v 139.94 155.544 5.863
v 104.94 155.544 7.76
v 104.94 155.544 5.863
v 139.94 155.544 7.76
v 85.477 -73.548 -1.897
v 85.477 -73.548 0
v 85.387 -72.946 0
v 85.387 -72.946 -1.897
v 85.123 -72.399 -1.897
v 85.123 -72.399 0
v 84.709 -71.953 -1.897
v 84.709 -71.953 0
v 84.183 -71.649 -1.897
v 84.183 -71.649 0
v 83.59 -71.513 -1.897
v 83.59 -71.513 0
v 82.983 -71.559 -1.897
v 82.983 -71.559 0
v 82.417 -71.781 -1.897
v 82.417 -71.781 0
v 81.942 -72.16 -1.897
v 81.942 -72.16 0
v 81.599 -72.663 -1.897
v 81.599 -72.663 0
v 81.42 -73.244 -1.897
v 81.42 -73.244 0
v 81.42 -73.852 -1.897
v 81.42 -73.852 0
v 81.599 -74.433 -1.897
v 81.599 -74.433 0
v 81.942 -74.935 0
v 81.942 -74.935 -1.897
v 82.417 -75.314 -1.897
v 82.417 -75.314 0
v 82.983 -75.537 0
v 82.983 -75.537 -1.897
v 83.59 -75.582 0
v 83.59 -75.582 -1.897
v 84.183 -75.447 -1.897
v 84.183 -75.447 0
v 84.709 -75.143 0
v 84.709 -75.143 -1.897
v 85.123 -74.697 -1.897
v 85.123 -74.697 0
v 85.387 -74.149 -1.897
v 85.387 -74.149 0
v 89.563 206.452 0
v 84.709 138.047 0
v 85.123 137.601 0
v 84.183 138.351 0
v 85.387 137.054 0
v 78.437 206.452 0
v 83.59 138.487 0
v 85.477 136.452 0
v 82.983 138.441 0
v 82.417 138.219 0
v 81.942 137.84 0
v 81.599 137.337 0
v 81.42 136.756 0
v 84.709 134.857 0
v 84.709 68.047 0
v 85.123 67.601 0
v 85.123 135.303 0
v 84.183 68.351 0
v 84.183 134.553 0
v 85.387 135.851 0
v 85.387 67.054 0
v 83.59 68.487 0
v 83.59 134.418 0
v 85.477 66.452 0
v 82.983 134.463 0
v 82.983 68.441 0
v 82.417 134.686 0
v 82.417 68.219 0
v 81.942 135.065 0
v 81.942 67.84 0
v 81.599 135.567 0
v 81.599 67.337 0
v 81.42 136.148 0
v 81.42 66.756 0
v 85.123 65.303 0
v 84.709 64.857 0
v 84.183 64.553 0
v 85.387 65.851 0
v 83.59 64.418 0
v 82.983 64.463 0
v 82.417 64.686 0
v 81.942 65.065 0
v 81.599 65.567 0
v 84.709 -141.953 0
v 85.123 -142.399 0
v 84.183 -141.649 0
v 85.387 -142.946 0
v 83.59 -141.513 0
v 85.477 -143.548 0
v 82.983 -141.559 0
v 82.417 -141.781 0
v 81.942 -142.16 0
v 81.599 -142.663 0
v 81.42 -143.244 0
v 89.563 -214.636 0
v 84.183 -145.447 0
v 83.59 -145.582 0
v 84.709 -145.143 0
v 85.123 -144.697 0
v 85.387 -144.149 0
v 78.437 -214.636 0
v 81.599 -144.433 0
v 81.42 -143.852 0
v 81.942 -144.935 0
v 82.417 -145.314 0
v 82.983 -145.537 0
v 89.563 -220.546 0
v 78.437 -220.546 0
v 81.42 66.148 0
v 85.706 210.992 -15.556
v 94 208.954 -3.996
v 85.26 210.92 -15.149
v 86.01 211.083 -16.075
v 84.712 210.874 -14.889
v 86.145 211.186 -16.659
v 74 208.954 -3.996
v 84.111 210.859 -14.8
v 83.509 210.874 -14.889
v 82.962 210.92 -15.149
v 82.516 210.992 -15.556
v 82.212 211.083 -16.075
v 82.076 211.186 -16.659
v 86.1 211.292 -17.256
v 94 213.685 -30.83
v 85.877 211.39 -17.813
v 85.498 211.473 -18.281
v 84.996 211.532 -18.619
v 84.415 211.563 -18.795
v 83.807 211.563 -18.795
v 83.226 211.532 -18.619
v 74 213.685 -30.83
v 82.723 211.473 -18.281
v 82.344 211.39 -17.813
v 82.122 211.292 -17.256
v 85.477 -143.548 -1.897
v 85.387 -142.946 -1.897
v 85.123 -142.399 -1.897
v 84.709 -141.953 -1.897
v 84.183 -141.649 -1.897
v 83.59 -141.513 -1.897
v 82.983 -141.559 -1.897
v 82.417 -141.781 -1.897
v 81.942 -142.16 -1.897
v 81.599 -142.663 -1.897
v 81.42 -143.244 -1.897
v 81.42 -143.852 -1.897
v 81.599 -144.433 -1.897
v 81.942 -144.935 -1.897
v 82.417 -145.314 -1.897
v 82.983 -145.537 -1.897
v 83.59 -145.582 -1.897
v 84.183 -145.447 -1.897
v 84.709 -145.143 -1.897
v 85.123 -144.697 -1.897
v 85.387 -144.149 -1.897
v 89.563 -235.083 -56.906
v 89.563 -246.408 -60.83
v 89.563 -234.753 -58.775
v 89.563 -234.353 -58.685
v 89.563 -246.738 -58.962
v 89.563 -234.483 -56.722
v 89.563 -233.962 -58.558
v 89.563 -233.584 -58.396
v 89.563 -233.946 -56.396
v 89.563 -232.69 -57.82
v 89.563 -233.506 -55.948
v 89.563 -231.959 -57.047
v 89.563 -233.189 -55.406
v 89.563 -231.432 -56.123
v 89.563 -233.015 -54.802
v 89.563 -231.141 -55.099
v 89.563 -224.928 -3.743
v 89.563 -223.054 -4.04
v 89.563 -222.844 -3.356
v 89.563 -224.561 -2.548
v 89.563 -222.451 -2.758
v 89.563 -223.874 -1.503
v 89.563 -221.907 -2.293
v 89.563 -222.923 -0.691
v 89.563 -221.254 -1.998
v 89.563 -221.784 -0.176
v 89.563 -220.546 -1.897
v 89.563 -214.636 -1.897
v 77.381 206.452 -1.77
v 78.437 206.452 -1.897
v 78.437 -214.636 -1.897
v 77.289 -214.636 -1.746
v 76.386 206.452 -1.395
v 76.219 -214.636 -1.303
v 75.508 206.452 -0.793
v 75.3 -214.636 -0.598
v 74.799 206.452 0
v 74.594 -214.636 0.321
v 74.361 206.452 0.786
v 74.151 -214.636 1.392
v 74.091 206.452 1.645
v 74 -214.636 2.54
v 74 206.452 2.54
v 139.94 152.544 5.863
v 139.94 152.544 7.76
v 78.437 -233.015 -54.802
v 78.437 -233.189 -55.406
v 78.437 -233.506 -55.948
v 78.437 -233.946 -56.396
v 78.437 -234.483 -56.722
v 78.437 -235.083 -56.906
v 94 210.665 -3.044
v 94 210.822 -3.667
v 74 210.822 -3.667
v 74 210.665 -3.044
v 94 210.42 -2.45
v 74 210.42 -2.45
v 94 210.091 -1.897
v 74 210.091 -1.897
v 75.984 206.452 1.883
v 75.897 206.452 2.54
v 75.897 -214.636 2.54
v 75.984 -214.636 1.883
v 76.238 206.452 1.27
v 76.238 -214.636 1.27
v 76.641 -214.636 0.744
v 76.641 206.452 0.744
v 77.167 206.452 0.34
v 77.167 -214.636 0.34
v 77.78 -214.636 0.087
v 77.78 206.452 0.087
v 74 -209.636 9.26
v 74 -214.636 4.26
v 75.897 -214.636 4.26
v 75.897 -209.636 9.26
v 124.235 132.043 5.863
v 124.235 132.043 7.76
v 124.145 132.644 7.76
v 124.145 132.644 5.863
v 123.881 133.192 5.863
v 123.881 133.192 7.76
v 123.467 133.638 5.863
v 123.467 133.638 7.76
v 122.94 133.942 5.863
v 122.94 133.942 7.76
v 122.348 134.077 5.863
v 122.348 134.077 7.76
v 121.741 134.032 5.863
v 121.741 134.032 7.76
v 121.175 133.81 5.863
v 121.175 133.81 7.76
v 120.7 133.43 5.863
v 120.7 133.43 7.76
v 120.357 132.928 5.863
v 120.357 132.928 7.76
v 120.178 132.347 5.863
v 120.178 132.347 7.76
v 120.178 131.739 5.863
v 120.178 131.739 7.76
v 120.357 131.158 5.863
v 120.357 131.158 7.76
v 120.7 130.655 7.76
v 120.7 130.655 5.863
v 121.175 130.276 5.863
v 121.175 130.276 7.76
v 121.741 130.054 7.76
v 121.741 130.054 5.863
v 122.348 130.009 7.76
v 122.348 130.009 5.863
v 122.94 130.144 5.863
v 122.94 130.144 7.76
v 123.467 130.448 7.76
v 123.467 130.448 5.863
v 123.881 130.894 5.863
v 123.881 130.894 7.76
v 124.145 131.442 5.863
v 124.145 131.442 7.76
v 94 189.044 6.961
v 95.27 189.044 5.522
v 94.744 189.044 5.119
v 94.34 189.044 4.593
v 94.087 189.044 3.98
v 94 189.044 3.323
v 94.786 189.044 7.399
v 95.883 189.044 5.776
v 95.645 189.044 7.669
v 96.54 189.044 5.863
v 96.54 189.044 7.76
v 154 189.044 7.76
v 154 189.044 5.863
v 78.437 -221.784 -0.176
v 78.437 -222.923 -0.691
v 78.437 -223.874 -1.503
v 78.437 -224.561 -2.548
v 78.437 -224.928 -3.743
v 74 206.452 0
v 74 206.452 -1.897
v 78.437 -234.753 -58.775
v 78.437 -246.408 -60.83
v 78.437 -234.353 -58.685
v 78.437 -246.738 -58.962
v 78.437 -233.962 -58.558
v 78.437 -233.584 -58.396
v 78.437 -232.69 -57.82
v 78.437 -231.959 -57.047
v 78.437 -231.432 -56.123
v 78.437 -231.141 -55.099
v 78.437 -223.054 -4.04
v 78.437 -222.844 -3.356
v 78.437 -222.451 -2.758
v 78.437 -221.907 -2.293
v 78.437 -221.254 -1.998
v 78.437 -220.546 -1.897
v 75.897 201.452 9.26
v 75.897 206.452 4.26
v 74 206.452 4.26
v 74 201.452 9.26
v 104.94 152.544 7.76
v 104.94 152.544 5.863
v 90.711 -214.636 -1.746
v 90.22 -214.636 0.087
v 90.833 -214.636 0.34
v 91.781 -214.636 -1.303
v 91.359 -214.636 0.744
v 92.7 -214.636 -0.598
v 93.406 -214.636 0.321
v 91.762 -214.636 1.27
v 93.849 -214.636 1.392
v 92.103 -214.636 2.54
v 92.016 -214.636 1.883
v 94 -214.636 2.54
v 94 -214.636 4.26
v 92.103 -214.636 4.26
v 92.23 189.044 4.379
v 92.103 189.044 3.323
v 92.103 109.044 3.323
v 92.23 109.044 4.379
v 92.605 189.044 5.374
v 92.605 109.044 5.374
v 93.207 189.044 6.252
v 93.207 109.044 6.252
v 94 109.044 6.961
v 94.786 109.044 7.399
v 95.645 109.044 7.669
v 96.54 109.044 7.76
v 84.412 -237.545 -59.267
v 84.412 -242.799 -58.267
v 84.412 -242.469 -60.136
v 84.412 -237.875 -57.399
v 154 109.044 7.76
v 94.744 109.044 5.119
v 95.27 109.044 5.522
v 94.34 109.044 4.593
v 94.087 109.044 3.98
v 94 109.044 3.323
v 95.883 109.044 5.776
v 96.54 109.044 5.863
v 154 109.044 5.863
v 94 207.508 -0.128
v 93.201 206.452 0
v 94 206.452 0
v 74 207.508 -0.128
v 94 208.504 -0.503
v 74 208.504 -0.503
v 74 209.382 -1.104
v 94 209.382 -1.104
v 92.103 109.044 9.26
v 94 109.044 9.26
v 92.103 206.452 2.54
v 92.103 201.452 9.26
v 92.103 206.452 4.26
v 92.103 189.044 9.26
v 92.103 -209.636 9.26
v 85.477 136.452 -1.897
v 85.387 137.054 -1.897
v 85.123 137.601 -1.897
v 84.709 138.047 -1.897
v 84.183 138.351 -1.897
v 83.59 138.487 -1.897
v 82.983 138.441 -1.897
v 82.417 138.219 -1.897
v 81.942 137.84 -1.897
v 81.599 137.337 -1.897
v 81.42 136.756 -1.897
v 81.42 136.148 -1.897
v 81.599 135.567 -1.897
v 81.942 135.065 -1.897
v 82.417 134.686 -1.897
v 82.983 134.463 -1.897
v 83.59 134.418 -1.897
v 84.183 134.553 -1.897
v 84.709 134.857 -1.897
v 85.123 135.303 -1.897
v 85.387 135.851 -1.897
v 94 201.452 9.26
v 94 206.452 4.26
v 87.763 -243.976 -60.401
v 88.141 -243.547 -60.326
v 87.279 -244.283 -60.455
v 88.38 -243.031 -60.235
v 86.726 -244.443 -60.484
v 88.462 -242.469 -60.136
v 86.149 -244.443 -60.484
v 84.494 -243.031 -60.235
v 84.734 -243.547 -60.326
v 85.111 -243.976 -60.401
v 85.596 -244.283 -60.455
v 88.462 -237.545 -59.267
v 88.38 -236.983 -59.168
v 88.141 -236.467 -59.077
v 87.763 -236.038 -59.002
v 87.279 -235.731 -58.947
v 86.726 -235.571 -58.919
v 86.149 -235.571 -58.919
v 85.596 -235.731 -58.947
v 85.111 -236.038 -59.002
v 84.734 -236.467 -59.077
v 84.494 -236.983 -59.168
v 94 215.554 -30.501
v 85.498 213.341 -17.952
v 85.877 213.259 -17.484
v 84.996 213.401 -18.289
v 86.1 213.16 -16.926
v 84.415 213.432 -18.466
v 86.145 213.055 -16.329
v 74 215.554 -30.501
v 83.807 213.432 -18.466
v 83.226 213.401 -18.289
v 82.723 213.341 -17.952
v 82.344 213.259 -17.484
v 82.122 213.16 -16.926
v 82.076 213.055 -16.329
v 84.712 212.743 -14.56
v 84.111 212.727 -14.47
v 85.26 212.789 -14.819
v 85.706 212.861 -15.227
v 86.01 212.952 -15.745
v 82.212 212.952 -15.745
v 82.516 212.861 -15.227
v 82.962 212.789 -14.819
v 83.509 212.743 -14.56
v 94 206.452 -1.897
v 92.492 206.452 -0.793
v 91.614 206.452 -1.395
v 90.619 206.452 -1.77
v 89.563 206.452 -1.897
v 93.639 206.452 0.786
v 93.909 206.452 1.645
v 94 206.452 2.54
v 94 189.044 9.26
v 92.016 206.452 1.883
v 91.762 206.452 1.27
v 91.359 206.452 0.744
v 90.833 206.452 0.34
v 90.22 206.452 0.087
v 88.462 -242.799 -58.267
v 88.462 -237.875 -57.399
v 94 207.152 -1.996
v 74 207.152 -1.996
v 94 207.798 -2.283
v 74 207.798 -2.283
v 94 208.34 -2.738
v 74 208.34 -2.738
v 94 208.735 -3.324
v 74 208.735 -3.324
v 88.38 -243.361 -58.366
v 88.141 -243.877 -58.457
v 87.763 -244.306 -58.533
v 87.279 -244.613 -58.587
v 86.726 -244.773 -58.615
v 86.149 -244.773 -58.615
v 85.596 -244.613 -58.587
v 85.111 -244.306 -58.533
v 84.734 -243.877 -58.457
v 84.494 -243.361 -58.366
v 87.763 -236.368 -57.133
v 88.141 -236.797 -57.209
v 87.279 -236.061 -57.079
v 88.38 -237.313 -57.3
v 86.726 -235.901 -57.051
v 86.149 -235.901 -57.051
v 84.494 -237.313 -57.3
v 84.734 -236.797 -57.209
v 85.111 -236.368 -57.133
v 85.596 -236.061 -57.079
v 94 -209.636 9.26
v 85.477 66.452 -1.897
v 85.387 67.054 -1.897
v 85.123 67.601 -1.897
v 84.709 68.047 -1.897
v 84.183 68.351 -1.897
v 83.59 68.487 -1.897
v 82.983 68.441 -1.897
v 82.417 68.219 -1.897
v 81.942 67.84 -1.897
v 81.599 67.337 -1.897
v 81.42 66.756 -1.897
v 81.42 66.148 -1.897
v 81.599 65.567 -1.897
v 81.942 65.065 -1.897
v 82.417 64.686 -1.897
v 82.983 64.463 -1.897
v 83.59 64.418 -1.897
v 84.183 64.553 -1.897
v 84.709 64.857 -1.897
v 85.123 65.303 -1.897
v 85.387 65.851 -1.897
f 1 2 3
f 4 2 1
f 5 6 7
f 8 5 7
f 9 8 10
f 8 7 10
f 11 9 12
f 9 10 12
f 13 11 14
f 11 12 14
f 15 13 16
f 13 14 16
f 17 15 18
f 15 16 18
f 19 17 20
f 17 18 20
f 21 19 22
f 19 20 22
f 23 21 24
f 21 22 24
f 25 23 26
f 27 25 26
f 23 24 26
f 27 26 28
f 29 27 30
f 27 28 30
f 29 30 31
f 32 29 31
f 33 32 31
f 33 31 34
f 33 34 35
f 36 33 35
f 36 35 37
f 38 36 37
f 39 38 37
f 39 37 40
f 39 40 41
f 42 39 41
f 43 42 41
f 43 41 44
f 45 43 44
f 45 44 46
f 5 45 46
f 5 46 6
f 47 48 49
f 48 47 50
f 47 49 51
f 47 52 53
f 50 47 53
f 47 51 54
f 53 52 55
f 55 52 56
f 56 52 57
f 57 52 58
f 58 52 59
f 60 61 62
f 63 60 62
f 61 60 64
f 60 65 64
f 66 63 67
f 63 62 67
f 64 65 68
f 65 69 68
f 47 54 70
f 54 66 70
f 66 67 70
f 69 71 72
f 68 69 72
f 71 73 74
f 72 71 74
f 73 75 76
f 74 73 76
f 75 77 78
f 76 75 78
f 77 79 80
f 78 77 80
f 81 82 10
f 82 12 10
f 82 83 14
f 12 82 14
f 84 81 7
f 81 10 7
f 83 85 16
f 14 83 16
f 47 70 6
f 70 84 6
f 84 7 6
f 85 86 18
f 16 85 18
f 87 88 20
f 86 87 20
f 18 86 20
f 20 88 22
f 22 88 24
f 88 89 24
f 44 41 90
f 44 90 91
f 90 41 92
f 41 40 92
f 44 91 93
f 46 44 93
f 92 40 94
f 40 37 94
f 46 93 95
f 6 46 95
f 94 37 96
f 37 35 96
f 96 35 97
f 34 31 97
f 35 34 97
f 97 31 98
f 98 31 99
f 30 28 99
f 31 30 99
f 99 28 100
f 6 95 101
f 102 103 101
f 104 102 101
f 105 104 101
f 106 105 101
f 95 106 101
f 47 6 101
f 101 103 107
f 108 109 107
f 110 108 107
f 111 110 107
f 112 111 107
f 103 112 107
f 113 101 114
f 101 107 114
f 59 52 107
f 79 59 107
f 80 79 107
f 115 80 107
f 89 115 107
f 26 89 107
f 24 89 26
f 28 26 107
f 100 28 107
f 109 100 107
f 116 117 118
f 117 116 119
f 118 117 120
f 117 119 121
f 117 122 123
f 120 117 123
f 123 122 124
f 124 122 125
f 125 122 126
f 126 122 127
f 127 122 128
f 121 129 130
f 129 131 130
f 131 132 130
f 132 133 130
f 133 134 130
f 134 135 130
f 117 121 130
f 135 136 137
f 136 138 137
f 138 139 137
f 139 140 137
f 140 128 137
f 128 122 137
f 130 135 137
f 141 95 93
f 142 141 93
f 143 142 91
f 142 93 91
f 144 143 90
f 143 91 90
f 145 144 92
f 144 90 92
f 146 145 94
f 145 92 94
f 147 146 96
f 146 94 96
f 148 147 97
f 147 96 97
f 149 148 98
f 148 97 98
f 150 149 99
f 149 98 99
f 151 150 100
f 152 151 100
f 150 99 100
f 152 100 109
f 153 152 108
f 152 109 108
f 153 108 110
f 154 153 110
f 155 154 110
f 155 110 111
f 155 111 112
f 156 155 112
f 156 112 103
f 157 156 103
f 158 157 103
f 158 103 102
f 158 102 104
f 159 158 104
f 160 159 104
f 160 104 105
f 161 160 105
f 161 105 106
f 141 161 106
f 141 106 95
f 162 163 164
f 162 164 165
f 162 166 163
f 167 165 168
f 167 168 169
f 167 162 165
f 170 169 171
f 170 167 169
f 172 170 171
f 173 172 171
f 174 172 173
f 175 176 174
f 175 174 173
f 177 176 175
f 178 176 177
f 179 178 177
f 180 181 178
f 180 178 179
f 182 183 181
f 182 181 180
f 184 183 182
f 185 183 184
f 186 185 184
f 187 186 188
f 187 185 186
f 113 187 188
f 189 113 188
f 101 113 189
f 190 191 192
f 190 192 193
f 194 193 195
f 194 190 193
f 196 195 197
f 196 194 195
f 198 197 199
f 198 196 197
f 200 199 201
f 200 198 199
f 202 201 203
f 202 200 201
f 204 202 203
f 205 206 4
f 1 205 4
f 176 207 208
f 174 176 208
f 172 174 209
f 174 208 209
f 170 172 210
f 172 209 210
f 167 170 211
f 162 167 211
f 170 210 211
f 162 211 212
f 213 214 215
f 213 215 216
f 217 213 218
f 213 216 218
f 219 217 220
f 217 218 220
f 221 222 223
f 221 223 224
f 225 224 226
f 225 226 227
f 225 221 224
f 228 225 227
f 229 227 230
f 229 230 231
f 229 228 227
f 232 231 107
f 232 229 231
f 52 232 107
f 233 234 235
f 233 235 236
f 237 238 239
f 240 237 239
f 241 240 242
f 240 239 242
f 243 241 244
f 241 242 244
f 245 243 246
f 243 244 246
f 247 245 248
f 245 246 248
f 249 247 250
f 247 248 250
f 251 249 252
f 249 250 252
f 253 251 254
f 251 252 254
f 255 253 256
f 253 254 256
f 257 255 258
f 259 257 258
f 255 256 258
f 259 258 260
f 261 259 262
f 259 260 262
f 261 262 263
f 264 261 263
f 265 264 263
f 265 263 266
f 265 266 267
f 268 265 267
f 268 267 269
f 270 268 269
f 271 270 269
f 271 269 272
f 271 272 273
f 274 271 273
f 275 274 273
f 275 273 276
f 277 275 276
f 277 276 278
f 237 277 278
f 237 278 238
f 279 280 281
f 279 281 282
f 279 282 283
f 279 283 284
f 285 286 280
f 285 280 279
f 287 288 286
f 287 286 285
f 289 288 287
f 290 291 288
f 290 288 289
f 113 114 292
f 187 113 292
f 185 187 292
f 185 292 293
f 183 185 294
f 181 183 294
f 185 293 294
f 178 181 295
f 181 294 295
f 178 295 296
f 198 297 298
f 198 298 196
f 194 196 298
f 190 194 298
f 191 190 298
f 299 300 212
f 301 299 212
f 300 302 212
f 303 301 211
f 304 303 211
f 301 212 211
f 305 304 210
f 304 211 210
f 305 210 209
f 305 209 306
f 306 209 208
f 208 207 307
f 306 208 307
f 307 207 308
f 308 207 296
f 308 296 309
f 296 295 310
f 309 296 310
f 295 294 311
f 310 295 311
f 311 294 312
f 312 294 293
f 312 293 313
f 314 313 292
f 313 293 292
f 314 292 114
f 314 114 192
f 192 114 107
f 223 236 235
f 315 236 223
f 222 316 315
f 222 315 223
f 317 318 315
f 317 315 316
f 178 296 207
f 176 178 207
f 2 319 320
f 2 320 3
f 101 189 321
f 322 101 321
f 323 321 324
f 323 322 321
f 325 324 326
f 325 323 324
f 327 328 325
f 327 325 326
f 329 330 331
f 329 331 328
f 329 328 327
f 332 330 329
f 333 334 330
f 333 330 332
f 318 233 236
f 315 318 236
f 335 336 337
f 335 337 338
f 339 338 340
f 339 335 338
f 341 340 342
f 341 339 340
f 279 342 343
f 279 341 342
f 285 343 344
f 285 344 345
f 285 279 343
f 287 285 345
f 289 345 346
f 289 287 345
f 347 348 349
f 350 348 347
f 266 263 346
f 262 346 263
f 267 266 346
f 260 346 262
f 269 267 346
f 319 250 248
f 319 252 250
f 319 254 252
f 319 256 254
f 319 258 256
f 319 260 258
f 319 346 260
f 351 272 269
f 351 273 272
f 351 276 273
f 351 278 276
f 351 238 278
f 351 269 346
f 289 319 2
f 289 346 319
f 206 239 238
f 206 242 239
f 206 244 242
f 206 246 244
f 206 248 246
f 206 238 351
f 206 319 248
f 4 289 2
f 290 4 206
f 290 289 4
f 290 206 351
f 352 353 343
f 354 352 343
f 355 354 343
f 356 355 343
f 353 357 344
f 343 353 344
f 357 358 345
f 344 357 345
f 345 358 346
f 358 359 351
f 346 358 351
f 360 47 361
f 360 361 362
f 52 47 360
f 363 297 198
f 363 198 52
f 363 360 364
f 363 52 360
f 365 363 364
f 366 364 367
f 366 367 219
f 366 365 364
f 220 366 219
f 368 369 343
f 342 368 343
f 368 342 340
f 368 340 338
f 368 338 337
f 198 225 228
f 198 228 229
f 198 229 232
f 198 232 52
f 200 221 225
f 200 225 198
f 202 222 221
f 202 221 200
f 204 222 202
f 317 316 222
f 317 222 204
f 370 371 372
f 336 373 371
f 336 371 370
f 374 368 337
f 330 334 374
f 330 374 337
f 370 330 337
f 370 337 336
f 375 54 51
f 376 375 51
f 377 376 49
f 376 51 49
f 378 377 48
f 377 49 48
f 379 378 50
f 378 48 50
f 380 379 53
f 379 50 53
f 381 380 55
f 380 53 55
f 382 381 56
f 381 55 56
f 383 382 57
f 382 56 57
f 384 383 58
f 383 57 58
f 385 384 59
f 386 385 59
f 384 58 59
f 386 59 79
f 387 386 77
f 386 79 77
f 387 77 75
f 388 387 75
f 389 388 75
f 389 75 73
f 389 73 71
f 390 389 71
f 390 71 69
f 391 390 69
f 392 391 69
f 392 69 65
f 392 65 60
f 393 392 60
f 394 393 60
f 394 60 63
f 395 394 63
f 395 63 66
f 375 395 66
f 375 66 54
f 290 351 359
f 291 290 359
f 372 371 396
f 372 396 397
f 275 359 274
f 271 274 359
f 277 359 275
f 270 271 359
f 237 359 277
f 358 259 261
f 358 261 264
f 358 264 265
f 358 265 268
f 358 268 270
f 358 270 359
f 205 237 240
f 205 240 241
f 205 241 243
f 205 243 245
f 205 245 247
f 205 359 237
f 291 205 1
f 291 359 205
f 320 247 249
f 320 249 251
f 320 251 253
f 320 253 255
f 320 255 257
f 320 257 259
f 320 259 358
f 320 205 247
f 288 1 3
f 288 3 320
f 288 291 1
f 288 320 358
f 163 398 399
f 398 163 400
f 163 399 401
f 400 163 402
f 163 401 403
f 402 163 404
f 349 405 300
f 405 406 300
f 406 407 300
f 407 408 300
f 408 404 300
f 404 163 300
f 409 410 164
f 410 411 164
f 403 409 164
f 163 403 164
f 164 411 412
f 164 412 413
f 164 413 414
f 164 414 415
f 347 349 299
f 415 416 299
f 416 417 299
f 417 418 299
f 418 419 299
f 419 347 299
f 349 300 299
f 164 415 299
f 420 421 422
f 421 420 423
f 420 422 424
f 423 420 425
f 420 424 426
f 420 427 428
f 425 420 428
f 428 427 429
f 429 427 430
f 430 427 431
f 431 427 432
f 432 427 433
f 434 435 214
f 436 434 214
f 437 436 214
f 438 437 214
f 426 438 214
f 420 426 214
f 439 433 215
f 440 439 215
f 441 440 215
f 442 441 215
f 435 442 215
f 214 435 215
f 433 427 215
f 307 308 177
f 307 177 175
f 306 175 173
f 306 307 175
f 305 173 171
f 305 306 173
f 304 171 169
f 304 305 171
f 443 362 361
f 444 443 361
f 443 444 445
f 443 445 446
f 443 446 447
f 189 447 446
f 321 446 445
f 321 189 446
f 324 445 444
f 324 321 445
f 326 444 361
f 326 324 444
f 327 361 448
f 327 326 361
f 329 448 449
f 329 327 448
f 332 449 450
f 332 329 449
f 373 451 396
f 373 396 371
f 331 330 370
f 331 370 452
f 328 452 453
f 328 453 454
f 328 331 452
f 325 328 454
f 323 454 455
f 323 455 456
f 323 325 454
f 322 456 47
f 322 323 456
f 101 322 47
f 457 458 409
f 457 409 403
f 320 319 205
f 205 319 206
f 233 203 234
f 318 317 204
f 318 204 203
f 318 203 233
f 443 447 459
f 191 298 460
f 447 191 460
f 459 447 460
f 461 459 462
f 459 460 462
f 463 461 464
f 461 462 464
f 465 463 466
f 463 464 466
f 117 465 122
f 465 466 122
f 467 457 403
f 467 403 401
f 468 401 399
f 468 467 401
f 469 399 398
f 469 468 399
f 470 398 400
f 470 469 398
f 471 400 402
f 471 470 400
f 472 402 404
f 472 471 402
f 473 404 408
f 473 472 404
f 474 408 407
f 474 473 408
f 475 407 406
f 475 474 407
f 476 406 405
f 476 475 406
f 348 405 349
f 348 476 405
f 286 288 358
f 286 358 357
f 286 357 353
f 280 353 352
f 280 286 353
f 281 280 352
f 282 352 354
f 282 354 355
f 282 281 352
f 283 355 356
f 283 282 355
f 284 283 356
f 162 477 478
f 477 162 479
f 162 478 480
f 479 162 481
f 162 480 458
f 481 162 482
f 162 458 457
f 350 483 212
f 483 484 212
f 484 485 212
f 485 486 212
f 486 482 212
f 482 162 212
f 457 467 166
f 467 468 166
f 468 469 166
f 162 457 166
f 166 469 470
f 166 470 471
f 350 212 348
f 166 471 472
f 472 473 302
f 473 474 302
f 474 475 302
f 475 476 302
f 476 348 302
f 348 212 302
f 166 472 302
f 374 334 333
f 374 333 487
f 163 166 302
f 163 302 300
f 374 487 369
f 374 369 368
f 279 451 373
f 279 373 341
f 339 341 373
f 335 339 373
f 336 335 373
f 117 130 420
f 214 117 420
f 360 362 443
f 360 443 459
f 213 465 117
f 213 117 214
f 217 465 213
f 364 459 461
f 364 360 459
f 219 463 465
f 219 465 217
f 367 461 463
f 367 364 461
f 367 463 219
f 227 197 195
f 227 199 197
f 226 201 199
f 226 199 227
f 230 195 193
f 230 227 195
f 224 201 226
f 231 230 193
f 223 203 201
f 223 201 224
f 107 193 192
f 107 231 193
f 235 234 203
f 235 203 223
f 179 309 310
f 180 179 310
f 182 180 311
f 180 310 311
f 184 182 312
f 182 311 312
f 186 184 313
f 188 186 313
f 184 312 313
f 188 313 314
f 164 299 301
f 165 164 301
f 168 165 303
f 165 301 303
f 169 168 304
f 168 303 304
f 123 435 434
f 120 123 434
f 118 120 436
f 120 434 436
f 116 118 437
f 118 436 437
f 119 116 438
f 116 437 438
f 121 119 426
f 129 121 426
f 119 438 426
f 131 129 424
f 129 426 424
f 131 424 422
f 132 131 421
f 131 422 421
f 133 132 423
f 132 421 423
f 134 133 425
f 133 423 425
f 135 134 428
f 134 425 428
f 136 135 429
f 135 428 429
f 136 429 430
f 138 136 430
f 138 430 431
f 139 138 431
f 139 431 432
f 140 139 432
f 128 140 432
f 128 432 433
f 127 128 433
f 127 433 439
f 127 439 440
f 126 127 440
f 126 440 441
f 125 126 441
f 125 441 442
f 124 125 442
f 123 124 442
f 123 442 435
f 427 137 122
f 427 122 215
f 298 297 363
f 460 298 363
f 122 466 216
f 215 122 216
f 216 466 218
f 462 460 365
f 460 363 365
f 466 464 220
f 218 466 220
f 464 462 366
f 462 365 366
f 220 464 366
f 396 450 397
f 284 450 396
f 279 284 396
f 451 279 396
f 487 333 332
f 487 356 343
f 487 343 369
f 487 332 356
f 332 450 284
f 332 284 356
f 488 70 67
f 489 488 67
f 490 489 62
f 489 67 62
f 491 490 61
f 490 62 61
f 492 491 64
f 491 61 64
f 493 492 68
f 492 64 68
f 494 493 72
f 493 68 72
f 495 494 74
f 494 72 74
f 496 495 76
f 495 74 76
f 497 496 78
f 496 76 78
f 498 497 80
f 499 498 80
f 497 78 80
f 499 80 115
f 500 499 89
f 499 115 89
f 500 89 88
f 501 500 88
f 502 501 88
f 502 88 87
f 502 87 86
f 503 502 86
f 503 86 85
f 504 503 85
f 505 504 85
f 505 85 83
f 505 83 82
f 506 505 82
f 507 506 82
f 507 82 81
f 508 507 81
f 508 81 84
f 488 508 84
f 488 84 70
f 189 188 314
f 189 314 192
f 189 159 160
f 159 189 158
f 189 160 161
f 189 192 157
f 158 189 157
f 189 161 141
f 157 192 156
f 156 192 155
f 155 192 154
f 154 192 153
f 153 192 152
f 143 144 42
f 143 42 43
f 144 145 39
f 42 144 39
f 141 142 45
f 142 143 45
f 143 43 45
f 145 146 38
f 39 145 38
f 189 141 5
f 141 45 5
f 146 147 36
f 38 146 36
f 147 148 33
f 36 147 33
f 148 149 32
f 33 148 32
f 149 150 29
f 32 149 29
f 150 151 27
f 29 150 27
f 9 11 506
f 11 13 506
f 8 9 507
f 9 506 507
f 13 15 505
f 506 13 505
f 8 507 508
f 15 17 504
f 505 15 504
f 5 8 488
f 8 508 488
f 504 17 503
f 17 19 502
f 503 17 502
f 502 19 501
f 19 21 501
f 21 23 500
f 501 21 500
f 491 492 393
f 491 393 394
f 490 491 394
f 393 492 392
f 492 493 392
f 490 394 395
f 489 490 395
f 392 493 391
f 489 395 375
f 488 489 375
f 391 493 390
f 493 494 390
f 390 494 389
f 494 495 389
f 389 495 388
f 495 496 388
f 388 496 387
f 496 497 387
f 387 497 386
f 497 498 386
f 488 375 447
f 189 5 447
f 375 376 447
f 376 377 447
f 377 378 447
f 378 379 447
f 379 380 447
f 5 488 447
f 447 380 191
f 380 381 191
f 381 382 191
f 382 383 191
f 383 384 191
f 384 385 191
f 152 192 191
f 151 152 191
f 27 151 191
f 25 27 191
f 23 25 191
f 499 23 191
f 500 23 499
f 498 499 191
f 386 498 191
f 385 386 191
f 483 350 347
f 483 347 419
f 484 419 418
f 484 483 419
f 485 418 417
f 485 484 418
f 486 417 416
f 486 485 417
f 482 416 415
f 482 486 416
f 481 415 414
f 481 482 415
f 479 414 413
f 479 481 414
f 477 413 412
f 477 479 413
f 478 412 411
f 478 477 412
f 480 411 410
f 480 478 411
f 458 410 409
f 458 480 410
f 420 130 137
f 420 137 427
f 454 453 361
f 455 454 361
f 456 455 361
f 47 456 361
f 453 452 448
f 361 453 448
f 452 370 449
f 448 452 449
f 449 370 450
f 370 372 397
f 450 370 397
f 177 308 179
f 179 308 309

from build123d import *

# Parameters (mm, degrees)
SKETCH1_W                      = 20
SKETCH1_H                      = 425.14614931
BASE_FLANGE1_DEPTH             = 1.89738
EDGE_FLANGE1_START             = 74
EDGE_FLANGE1_DEPTH             = 20
EDGE_FLANGE1_2_DEPTH           = 20
EDGE_FLANGE3_STRIP_W           = 12.66952
EDGE_FLANGE3_STRIP_H           = 1.89738
EDGE_FLANGE3_STRIP_CUT_DEPTH   = 421.088186102
EDGE_FLANGE3_STRIP_2_W         = 12.66952
EDGE_FLANGE3_STRIP_2_H         = 1.89738
EDGE_FLANGE3_STRIP_CUT_2_DEPTH = 421.088186102
EDGE_FLANGE3_DEPTH             = 421.088186102
EDGE_FLANGE3_BEND_DEPTH        = 421.088186102
EDGE_FLANGE5_START             = 78.43738
EDGE_FLANGE5_DEPTH             = 11.12524
EDGE_FLANGE6_START             = 78.43738
EDGE_FLANGE6_DEPTH             = 11.12524
EDGE_FLANGE6_2_DEPTH           = 11.12524
SKETCH31_R                     = 2.04
CUT_EXTRUDE1_DEPTH             = 10
CUT_EXTRUDE2_DEPTH             = 3.21412
BREAK_CORNER1_START            = 74
BREAK_CORNER1_DEPTH            = 20
EDGE_FLANGE7_STRIP_W           = 14.16952
EDGE_FLANGE7_STRIP_H           = 1.89738
EDGE_FLANGE7_STRIP_CUT_DEPTH   = 80
EDGE_FLANGE7_DEPTH             = 80
SKETCH36_W                     = 35
SKETCH36_H                     = 3
CUT_EXTRUDE3_DEPTH             = 10
SKETCH37_R                     = 2.04
CUT_EXTRUDE4_DEPTH             = 10
SKETCH38_R                     = 2.04
CUT_EXTRUDE6_DEPTH             = 10


# Read off the part's stored shape, not the designer's step: Edge-Flange1, Edge-Flange5, Edge-Flange6, Break-Corner1
# Sheet-metal steps are written as plain solids
with BuildPart() as part:
    # Sketch1 → Base-Flange1 (new body)
    with BuildSketch(Plane.XY):
        with Locations((84, -2.062852184)):
            Rectangle(SKETCH1_W, SKETCH1_H)
    extrude(amount=-BASE_FLANGE1_DEPTH)

    # Edge-Flange1 outline → Edge-Flange1 (cut)
    with BuildSketch(Plane.YZ.offset(EDGE_FLANGE1_START)):
        with BuildLine():
            ThreePointArc((206.452259263, 0), (208.504014129, -0.502835143), (210.090767372, -1.89738))
            Line((210.090767372, -1.89738), (210.510222471, -1.89738))
            Line((210.510222471, -1.89738), (210.510222471, 0))
            Line((210.510222471, 0), (206.452259263, 0))
        make_face()
    extrude(amount=EDGE_FLANGE1_DEPTH, mode=Mode.SUBTRACT)

    # Edge-Flange1 2 outline → Edge-Flange1 2 (add)
    with BuildSketch(Plane.YZ.offset(EDGE_FLANGE1_START)):
        with BuildLine():
            Line((215.55374818, -30.500635662), (210.82222549, -3.666837049))
            ThreePointArc((210.82222549, -3.666837049), (210.553071361, -2.742186382), (210.090767372, -1.89738))
            Line((210.090767372, -1.89738), (206.452259263, -1.89738))
            ThreePointArc((206.452259263, -1.89738), (208.084939792, -2.491627114), (208.953670956, -3.996313629))
            Line((208.953670956, -3.996313629), (213.685193646, -30.830112242))
            Line((213.685193646, -30.830112242), (215.55374818, -30.500635662))
        make_face()
    extrude(amount=EDGE_FLANGE1_2_DEPTH)

    # Edge-Flange3 strip (across the edge) → Edge-Flange3 strip cut (cut)
    with BuildSketch(Plane(origin=(74, 206.452259263, 0), x_dir=(1, 0, 0), z_dir=(0, -1, 0))):
        with Locations((-1.89738, -0.94869)):
            Rectangle(EDGE_FLANGE3_STRIP_W, EDGE_FLANGE3_STRIP_H)
    extrude(amount=EDGE_FLANGE3_STRIP_CUT_DEPTH, mode=Mode.SUBTRACT)

    # Edge-Flange3 strip 2 (across the edge) → Edge-Flange3 strip cut 2 (cut)
    with BuildSketch(Plane(origin=(94, -214.635926839, 0), x_dir=(-1, 0, 0), z_dir=(0, 1, 0))):
        with Locations((-1.89738, -0.94869)):
            Rectangle(EDGE_FLANGE3_STRIP_2_W, EDGE_FLANGE3_STRIP_2_H)
    extrude(amount=EDGE_FLANGE3_STRIP_CUT_2_DEPTH, mode=Mode.SUBTRACT)

    # Edge-Flange3 section (across the edge) → Edge-Flange3 (add)
    with BuildSketch(Plane(origin=(74, 206.452259263, 0), x_dir=(1, 0, 0), z_dir=(0, -1, 0))):
        with BuildLine():
            Line((0, 2.54), (0, 9.26))
            Line((0, 9.26), (1.89738, 9.26))
            Line((1.89738, 9.26), (1.89738, 2.54))
            ThreePointArc((1.89738, 2.54), (2.641328776, 0.743948776), (4.43738, 0))
            Line((4.43738, 0), (4.43738, -1.89738))
            ThreePointArc((4.43738, -1.89738), (1.299678511, -0.597701489), (0, 2.54))
        make_face()
    extrude(amount=EDGE_FLANGE3_DEPTH)

    # Edge-Flange3 section 2 (across the edge) → Edge-Flange3 bend (add)
    with BuildSketch(Plane(origin=(94, -214.635926839, 0), x_dir=(-1, 0, 0), z_dir=(0, 1, 0))):
        with BuildLine():
            Line((0, 2.54), (0, 9.26))
            Line((0, 9.26), (1.89738, 9.26))
            Line((1.89738, 9.26), (1.89738, 2.54))
            ThreePointArc((1.89738, 2.54), (2.641328776, 0.743948776), (4.43738, 0))
            Line((4.43738, 0), (4.43738, -1.89738))
            ThreePointArc((4.43738, -1.89738), (1.299678511, -0.597701489), (0, 2.54))
        make_face()
    extrude(amount=EDGE_FLANGE3_BEND_DEPTH)

    # Edge-Flange5 outline → Edge-Flange5 (add)
    with BuildSketch(Plane.YZ.offset(EDGE_FLANGE5_START)):
        with BuildLine():
            ThreePointArc((-220.545530818, 0), (-223.427378599, -1.063169777), (-224.928279306, -3.743220834))
            Line((-224.928279306, -3.743220834), (-233.964581883, -60.796189915))
            Line((-233.964581883, -60.796189915), (-232.090561779, -61.09300554))
            Line((-232.090561779, -61.09300554), (-223.054259203, -4.040036459))
            ThreePointArc((-223.054259203, -4.040036459), (-222.195128861, -2.505948848), (-220.545530818, -1.89738))
            Line((-220.545530818, -1.89738), (-214.635926839, -1.89738))
            Line((-214.635926839, -1.89738), (-214.635926839, 0))
            Line((-214.635926839, 0), (-220.545530818, 0))
        make_face()
    extrude(amount=EDGE_FLANGE5_DEPTH)

    # Edge-Flange6 outline → Edge-Flange6 (cut)
    with BuildSketch(Plane.YZ.offset(EDGE_FLANGE6_START)):
        with BuildLine():
            ThreePointArc((-231.141243496, -55.099245789), (-231.958853079, -57.047079402), (-233.584451669, -58.3961422))
            Line((-233.584451669, -58.3961422), (-233.964581883, -60.796189915))
            Line((-233.964581883, -60.796189915), (-232.090561779, -61.09300554))
            Line((-232.090561779, -61.09300554), (-231.141243496, -55.099245789))
        make_face()
    extrude(amount=EDGE_FLANGE6_DEPTH, mode=Mode.SUBTRACT)

    # Edge-Flange6 2 outline → Edge-Flange6 2 (add)
    with BuildSketch(Plane.YZ.offset(EDGE_FLANGE6_START)):
        with BuildLine():
            Line((-246.408498712, -60.830152569), (-234.753449034, -58.775052849))
            ThreePointArc((-234.753449034, -58.775052849), (-234.155770092, -58.626260643), (-233.584451669, -58.3961422))
            Line((-233.584451669, -58.3961422), (-233.015263599, -54.802430164))
            ThreePointArc((-233.015263599, -54.802430164), (-233.712335844, -56.185396154), (-235.082925613, -56.906498315))
            Line((-235.082925613, -56.906498315), (-246.737975292, -58.961598035))
            Line((-246.737975292, -58.961598035), (-246.408498712, -60.830152569))
        make_face()
    extrude(amount=EDGE_FLANGE6_2_DEPTH)

    # Sketch31 → Cut-Extrude1 (cut)
    with BuildSketch(Plane(origin=(0, 203.838091474, 35.942155223), x_dir=(1, 0, 0), z_dir=(0, 0.9848077530122075, 0.17364817766693413))):
        with Locations(Location((84.110673768, 53.230127546, 0), (0, 0, 270))):
            Circle(SKETCH31_R)
    extrude(amount=-CUT_EXTRUDE1_DEPTH, mode=Mode.SUBTRACT)

    # Sketch32 → Cut-Extrude2 (cut)
    with BuildSketch(Plane(origin=(0, 2.642966784, -14.989009472), x_dir=(1, 0, 0), z_dir=(0, -0.17364817766693053, 0.984807753012208))):
        with BuildLine():
            Line((84.41238, -249.228045081), (84.41238, -244.228045081))
            ThreePointArc((84.41238, -244.228045081), (86.43738, -242.203045081), (88.46238, -244.228045081))
            Line((88.46238, -244.228045081), (88.46238, -249.228045081))
            ThreePointArc((88.46238, -249.228045081), (86.43738, -251.253045081), (84.41238, -249.228045081))
        make_face()
    extrude(amount=-CUT_EXTRUDE2_DEPTH, mode=Mode.SUBTRACT)

    # Break-Corner1 outline → Break-Corner1 (cut)
    with BuildSketch(Plane.YZ.offset(BREAK_CORNER1_START)):
        Polygon((-214.635926839, 9.26), (-214.635926839, 4.26), (-209.635926839, 9.26), align=None)
        Polygon((206.452259263, 9.26), (201.452259263, 9.26), (206.452259263, 4.26), align=None)
    extrude(amount=BREAK_CORNER1_DEPTH, mode=Mode.SUBTRACT)

    # Edge-Flange7 strip (across the edge) → Edge-Flange7 strip cut (cut)
    with BuildSketch(Plane(origin=(94, 189.043786616, 7.76), x_dir=(0, 0, -1), z_dir=(0, -1, 0))):
        with Locations((-2.64738, -0.94869)):
            Rectangle(EDGE_FLANGE7_STRIP_W, EDGE_FLANGE7_STRIP_H)
    extrude(amount=EDGE_FLANGE7_STRIP_CUT_DEPTH, mode=Mode.SUBTRACT)

    # Edge-Flange7 section (across the edge) → Edge-Flange7 (add)
    with BuildSketch(Plane(origin=(94, 189.043786616, 7.76), x_dir=(0, 0, -1), z_dir=(0, -1, 0))):
        with BuildLine():
            Line((0, 2.54), (0, 60))
            Line((0, 60), (1.89738, 60))
            Line((1.89738, 60), (1.89738, 2.54))
            ThreePointArc((1.89738, 2.54), (2.641328776, 0.743948776), (4.43738, 0))
            Line((4.43738, 0), (4.43738, -1.89738))
            ThreePointArc((4.43738, -1.89738), (1.299678511, -0.597701489), (0, 2.54))
        make_face()
    extrude(amount=EDGE_FLANGE7_DEPTH)

    # Sketch36 → Cut-Extrude3 (cut)
    with BuildSketch(Plane.XY.offset(7.76)):
        with Locations((122.44, 154.043786616)):
            Rectangle(SKETCH36_W, SKETCH36_H)
    extrude(amount=-CUT_EXTRUDE3_DEPTH, mode=Mode.SUBTRACT)

    # Sketch37 → Cut-Extrude4 (cut)
    with BuildSketch(Plane.XY):
        with Locations((83.43738, 136.452259263)):
            Circle(SKETCH37_R)
        with Locations((83.43738, 66.452259263)):
            Circle(SKETCH37_R)
        with Locations((83.43738, -73.547740737)):
            Circle(SKETCH37_R)
        with Locations((83.43738, -143.547740737)):
            Circle(SKETCH37_R)
    extrude(amount=-CUT_EXTRUDE4_DEPTH, mode=Mode.SUBTRACT)

    # Sketch38 → Cut-Extrude6 (cut)
    with BuildSketch(Plane.XY.offset(7.76)):
        with Locations((122.195161073, 132.04291448)):
            Circle(SKETCH38_R)
    extrude(amount=-CUT_EXTRUDE6_DEPTH, mode=Mode.SUBTRACT)


solid = part.part
